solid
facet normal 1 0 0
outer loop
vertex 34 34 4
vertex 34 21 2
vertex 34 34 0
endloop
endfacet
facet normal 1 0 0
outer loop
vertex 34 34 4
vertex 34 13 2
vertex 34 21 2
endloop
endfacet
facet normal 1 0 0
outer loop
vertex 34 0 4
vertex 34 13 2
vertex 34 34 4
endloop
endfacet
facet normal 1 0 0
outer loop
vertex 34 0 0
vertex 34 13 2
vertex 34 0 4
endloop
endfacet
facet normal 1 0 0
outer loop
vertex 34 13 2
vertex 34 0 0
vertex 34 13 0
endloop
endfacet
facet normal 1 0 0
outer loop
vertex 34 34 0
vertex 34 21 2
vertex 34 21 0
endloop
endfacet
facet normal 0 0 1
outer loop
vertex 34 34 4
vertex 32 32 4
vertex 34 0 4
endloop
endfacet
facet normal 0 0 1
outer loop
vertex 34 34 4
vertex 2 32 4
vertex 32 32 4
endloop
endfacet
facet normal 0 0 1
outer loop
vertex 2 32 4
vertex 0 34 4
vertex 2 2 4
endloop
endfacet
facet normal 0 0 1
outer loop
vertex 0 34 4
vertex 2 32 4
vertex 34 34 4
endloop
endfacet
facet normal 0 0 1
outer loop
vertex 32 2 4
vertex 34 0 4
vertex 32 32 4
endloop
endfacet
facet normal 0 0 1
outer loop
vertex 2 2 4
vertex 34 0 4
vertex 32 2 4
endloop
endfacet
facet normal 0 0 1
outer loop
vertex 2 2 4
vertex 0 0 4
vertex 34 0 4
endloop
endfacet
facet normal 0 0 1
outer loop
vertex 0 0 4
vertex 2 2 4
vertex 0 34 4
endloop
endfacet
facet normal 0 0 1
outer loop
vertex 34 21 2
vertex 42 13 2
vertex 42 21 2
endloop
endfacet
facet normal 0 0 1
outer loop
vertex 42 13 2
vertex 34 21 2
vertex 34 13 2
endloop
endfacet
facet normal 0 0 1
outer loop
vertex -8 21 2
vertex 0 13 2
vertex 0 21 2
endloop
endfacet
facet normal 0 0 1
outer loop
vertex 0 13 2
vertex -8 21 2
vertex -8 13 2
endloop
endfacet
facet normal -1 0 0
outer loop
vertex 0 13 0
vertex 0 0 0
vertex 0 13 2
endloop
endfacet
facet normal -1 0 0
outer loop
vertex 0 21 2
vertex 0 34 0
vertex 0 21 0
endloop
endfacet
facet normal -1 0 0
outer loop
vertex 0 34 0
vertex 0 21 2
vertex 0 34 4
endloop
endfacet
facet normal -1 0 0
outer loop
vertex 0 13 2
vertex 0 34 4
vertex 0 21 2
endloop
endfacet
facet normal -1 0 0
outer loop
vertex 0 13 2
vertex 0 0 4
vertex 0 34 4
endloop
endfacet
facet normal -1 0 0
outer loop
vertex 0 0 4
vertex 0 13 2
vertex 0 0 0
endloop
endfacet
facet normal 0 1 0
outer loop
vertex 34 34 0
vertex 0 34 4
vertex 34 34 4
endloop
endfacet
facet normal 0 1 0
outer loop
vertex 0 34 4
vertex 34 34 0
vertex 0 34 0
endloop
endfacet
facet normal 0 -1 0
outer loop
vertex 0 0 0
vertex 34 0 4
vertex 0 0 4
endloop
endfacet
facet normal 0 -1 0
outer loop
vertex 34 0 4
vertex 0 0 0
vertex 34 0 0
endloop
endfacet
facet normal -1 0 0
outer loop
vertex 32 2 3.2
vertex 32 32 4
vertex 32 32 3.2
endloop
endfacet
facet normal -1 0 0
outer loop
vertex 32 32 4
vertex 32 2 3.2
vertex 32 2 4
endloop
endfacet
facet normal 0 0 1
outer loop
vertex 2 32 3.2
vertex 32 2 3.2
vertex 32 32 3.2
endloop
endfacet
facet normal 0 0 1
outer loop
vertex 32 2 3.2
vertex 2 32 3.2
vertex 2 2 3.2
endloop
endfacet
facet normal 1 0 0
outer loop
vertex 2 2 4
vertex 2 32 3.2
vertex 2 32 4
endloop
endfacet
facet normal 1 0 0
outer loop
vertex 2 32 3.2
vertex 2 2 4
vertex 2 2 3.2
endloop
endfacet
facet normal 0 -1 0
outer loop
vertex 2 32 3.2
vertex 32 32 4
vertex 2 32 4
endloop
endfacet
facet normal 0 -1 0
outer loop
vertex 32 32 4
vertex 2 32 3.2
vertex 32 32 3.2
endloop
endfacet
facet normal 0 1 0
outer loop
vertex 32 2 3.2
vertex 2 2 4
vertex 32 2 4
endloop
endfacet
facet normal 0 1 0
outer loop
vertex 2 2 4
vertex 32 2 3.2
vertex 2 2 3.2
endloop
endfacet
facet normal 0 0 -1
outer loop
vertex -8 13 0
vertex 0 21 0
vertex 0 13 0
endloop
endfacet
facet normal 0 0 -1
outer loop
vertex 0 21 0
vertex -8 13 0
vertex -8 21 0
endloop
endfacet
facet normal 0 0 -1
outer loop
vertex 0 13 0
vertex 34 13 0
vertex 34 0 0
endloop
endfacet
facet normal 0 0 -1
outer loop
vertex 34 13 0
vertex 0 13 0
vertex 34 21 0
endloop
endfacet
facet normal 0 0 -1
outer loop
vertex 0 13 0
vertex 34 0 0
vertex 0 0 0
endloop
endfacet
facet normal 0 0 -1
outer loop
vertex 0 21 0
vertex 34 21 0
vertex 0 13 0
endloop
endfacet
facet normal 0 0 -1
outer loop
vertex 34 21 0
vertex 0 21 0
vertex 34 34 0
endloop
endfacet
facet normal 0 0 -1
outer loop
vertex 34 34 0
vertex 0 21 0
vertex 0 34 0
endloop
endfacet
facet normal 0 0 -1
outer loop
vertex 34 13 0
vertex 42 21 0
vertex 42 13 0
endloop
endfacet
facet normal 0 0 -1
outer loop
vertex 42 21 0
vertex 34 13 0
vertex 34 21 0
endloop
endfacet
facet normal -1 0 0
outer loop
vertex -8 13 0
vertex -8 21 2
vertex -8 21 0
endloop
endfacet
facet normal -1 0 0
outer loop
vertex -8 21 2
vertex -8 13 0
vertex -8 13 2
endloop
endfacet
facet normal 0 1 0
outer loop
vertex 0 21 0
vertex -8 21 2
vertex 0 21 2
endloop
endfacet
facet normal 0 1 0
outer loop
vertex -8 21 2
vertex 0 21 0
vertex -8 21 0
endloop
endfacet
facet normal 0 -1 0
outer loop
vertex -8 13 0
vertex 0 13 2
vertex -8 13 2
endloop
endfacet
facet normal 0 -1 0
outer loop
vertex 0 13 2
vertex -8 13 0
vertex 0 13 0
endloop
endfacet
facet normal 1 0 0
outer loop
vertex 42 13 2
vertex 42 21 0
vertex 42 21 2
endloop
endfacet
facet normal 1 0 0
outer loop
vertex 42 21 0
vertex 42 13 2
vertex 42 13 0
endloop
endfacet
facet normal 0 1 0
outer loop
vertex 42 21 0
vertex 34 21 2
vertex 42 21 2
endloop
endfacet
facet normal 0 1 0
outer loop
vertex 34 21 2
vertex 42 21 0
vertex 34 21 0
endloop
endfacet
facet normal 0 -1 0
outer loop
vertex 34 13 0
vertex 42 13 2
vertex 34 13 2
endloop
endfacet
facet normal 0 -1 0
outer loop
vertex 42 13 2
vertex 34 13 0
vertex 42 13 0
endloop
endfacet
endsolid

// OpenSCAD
// =============================================================================
// ISKANDER HEARTH — Standalone QR Code Repair Surface v1
// File: qr_surface_v1.scad
// =============================================================================
// License : CERN Open Hardware Licence v2 – Strongly Reciprocal (CERN-OHL-S)
//           https://ohwr.org/cern_ohl_s_v2.txt
//
// WHAT THIS FILE IS
//   A printable QR code holder tile that can be adhesive-mounted to the
//   interior of ANY chassis (commercial Mini-ITX cases, Tier 1 Mini PCs, etc.)
//   when a custom Iskander Hearth chassis has not been built yet.
//
//   Inspired by Framework Laptop's internal repair QR system.
//
// HOW TO USE
//   1. Print this tile in PLA or PETG (no supports needed).
//   2. Generate a QR code linking to the component's repair guide.
//      Recommended size: 26×26mm (fits within the 28×28mm recess with margin).
//   3. Print on adhesive polyester label stock and trim to 28×28mm.
//   4. Press the label into the recessed area — the 2mm border holds it flush.
//   5. Apply 3M double-sided foam tape to the flat back of the tile.
//   6. Mount inside your chassis wall next to the relevant component.
//
// THREE TILES ARE NEEDED PER TIER 2 BUILD
//   - GPU bay tile   → links to boms/tier2_commons.md (component T2-004)
//   - PSU bay tile   → links to boms/tier2_commons.md (component T2-007)
//   - SSD bay tile   → links to boms/tier2_commons.md (component T2-006)
// =============================================================================

// =============================================================================
// PARAMETERS — modify here
// =============================================================================

qr_size          = 30;   // [mm]  Square area for the QR sticker. 30mm = Framework standard.
                         //       <-- CHANGE ME if your sticker is a different size

qr_recess_depth  = 0.8;  // [mm]  How deep the sticker sits into the recess.
                         //       Increase if your label stock is thick.

qr_border        = 2;    // [mm]  Raised border width around the recess.
                         //       2mm provides enough structure for the sticker edge.

tile_thickness   = 2.0;  // [mm]  Total tile thickness including platform.
                         //       2mm is printable and rigid enough.

mount_tab_w      = 8;    // [mm]  Width of the mounting tab on each of the two sides.
mount_tab_h      = 5;    // [mm]  Height of mounting tab (protrudes below the tile base).
                         //       The tabs act as guides when pressing the tile against a wall.

// =============================================================================
// DERIVED DIMENSIONS
// =============================================================================

total_w = qr_size + qr_border * 2;    // = 30 + 4 = 34mm (outer width of tile)
total_d = qr_size + qr_border * 2;    // = 34mm (outer depth)
platform_raise = 2.0;                  // [mm]  How far the QR platform sits above the base

// =============================================================================
// QR SURFACE TILE MODULE
// =============================================================================

module qr_tile() {
    union() {
        // Base plate — the flat back that adheres to the chassis wall
        cube([total_w, total_d, tile_thickness]);

        // Raised platform — sits on top of base plate, recessed for sticker
        translate([0, 0, tile_thickness])
        difference() {
            // Platform solid
            cube([total_w, total_d, platform_raise]);

            // Sticker recess — sunken area for QR label
            // Recess is exactly qr_size × qr_size, qr_recess_depth deep
            translate([qr_border, qr_border, platform_raise - qr_recess_depth])
            cube([qr_size, qr_size, qr_recess_depth + 0.1]);
        }

        // Left mounting tab
        translate([-mount_tab_w, total_d / 2 - 4, 0])
        cube([mount_tab_w, 8, tile_thickness]);

        // Right mounting tab
        translate([total_w, total_d / 2 - 4, 0])
        cube([mount_tab_w, 8, tile_thickness]);
    }
}

// =============================================================================
// RENDER
// Press F6, then File > Export > Export as STL.
// Print 3 copies per Tier 2 node: GPU / PSU / SSD bay.
// =============================================================================

qr_tile();
